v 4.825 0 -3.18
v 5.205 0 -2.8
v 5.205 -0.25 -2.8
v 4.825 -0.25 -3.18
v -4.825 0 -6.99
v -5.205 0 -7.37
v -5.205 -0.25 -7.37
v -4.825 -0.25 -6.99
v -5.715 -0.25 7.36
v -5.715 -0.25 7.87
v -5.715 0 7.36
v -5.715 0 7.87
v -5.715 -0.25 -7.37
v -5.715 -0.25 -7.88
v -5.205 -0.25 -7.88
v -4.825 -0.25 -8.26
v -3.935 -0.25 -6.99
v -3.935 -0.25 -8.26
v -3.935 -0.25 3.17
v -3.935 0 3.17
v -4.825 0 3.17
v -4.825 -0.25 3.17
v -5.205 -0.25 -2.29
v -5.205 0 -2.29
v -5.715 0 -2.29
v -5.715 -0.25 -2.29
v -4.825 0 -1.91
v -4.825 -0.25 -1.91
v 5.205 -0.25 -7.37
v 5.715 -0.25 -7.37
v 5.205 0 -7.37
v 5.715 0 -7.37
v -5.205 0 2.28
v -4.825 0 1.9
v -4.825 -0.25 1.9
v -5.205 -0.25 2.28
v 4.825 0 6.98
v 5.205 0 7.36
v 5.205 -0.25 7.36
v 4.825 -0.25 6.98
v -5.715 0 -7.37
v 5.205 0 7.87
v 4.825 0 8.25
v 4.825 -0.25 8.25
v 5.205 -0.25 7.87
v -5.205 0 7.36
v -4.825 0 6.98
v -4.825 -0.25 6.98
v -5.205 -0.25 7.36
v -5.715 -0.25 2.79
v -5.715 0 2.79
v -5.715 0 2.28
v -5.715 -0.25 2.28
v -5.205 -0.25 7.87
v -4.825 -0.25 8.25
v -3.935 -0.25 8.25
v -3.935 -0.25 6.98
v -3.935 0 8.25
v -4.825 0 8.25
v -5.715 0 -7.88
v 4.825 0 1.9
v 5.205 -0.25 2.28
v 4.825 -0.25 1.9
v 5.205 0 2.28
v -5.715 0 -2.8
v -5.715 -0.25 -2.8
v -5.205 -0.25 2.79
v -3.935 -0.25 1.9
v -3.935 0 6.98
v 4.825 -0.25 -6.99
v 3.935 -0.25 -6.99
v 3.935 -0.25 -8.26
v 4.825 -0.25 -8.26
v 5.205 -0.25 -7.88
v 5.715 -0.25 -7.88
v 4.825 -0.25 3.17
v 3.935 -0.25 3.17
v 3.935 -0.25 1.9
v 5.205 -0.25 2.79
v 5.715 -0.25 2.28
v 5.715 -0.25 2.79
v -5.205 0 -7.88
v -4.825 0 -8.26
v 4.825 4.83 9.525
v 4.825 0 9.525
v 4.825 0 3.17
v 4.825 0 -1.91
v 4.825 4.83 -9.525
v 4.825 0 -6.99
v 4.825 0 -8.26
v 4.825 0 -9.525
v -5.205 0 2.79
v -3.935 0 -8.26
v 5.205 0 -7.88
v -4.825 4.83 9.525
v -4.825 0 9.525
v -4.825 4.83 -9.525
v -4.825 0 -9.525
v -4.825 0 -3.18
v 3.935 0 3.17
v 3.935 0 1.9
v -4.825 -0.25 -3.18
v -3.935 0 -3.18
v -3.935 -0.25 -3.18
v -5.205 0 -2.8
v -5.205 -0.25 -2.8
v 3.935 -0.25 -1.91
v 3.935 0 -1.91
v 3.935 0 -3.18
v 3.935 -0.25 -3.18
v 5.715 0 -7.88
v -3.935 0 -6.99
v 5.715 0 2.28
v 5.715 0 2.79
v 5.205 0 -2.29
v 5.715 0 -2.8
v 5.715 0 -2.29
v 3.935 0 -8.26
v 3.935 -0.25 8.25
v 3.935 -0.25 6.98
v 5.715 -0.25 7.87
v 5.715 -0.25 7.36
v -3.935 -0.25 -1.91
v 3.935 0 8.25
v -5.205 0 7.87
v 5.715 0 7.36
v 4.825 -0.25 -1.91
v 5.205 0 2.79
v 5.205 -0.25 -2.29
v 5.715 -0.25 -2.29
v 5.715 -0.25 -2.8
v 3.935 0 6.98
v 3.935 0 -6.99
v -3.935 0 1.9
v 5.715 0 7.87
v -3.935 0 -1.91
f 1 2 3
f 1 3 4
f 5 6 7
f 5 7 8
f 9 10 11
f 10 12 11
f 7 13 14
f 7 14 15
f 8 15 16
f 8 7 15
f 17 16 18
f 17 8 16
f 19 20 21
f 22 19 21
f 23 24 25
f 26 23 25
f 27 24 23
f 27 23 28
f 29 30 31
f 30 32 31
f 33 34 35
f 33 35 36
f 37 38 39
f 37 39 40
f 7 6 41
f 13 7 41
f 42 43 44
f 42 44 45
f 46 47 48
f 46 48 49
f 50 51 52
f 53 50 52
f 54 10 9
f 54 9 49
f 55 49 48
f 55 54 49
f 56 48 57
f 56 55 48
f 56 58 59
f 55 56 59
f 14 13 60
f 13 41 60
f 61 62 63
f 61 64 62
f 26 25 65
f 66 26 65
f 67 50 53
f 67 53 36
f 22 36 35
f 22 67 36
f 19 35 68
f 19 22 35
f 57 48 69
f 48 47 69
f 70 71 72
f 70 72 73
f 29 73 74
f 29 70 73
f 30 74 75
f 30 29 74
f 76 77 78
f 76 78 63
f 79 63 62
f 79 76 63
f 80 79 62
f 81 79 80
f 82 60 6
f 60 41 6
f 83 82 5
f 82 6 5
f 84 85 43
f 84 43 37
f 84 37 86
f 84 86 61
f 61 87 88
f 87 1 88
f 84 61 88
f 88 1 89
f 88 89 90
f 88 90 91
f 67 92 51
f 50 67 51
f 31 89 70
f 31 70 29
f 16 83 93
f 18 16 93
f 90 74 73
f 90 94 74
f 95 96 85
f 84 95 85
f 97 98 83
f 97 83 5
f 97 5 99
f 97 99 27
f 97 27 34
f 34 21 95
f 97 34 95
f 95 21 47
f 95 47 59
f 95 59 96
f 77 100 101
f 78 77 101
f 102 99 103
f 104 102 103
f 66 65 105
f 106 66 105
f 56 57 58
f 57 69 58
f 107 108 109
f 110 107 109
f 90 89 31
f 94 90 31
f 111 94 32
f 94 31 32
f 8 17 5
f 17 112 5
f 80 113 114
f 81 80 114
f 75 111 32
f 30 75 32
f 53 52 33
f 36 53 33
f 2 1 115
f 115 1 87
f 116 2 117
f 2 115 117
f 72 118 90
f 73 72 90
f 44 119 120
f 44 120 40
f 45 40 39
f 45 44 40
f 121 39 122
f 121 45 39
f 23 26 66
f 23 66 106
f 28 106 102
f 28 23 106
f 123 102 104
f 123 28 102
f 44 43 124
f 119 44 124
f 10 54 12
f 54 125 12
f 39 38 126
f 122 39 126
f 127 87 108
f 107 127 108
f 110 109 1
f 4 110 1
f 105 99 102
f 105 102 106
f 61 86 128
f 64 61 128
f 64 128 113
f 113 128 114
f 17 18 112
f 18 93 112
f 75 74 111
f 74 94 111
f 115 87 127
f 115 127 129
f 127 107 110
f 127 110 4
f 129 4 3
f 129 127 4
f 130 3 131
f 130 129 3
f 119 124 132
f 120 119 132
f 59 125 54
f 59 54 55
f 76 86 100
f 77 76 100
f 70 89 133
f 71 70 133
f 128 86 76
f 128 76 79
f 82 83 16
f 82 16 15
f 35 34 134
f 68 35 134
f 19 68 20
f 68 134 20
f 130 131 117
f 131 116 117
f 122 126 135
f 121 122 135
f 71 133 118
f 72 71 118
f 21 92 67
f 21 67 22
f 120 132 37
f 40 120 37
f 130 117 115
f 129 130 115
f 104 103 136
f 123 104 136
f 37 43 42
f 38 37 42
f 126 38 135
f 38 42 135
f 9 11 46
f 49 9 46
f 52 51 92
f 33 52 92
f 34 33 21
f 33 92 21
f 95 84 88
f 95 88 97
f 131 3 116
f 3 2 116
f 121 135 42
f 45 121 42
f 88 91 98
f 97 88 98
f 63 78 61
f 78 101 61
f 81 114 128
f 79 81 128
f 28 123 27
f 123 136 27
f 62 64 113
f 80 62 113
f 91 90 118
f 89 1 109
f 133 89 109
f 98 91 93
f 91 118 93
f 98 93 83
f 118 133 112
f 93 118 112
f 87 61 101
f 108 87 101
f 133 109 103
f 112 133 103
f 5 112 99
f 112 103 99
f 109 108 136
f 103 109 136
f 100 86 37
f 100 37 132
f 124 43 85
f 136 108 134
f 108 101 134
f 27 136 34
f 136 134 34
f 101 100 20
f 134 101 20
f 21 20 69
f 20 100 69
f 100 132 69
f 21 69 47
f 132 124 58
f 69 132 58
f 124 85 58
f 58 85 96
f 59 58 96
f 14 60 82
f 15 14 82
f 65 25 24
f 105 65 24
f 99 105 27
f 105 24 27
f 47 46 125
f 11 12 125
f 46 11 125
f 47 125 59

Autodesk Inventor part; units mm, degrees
ref_plane "YZ Plane" through (0, 0, 0) normal (1, 0, 0) x (0, 1, 0)
ref_plane "XZ Plane" through (0, 0, 0) normal (0, 1, 0) x (-1, 0, 0)
ref_plane "XY Plane" through (0, 0, 0) normal (0, 0, 1) x (1, 0, 0)
sketch "Sketch1" plane through (0, 0, 0) normal (0, 1, 0) x (-1, 0, 0)
  line L0 (4.825, 9.525) -> (-4.825, 9.525)
  line L1 (-4.825, 9.525) -> (-4.825, -9.525)
  line L2 (-4.825, -9.525) -> (4.825, -9.525)
  line L3 (4.825, -9.525) -> (4.825, 9.525)
  point P0 (0, 0)
  dimension "d0" = 9.65
  dimension "d1" = 4.825
  dimension "d2" = 19.05
  dimension "d3" = 9.525
extrude "Extrusion1" add sketch "Sketch1" along normal blind 4.83
sketch "Sketch2" plane through (0, 0, 0) normal (0, -1, 0) x (1, 0, 0)
  line L0 (5.715, 8.25) -> (3.935, 8.25)
  line L1 (3.935, 8.25) -> (3.935, 6.98)
  line L2 (3.935, 6.98) -> (5.715, 6.98)
  line L3 (5.715, 6.98) -> (5.715, 8.25)
  line L4 (-4.825, 9.525) -> (4.825, 9.525) projected
  line L5 (4.825, 9.525) -> (4.825, -9.525) projected
  line L6 (5.715, 7.87) -> (5.205, 7.87)
  line L7 (5.205, 7.36) -> (5.715, 7.36)
  line L8 (5.715, 7.36) -> (5.715, 7.87)
  line L9 (4.825, 8.25) -> (5.205, 7.87)
  line L10 (5.205, 7.36) -> (4.825, 6.98)
  point P0 (0, 0)
  dimension "d6" = 1.27
  dimension "d7" = 1.78
  dimension "d8" = 5.715
  dimension "d9" = 1.275
  dimension "d10" = 0.51
  dimension "d11" = 0.38
  dimension "d12" = 45
  dimension "d13" = 45
extrude "Extrusion2" add sketch "Sketch2" along normal blind 0.25 contours L5 L2 L1 L0 | L9 L6 L3 L7 L10 L5
pattern_linear "Rectangular Pattern1" count 4 spacing 5.08 along (0, 0, -1) of "Extrusion2"
mirror "Mirror1" about plane through (0, 0, 0) normal (1, 0, 0) of "Extrusion2", "Rectangular Pattern1"
properties part number "MC_YY101"
